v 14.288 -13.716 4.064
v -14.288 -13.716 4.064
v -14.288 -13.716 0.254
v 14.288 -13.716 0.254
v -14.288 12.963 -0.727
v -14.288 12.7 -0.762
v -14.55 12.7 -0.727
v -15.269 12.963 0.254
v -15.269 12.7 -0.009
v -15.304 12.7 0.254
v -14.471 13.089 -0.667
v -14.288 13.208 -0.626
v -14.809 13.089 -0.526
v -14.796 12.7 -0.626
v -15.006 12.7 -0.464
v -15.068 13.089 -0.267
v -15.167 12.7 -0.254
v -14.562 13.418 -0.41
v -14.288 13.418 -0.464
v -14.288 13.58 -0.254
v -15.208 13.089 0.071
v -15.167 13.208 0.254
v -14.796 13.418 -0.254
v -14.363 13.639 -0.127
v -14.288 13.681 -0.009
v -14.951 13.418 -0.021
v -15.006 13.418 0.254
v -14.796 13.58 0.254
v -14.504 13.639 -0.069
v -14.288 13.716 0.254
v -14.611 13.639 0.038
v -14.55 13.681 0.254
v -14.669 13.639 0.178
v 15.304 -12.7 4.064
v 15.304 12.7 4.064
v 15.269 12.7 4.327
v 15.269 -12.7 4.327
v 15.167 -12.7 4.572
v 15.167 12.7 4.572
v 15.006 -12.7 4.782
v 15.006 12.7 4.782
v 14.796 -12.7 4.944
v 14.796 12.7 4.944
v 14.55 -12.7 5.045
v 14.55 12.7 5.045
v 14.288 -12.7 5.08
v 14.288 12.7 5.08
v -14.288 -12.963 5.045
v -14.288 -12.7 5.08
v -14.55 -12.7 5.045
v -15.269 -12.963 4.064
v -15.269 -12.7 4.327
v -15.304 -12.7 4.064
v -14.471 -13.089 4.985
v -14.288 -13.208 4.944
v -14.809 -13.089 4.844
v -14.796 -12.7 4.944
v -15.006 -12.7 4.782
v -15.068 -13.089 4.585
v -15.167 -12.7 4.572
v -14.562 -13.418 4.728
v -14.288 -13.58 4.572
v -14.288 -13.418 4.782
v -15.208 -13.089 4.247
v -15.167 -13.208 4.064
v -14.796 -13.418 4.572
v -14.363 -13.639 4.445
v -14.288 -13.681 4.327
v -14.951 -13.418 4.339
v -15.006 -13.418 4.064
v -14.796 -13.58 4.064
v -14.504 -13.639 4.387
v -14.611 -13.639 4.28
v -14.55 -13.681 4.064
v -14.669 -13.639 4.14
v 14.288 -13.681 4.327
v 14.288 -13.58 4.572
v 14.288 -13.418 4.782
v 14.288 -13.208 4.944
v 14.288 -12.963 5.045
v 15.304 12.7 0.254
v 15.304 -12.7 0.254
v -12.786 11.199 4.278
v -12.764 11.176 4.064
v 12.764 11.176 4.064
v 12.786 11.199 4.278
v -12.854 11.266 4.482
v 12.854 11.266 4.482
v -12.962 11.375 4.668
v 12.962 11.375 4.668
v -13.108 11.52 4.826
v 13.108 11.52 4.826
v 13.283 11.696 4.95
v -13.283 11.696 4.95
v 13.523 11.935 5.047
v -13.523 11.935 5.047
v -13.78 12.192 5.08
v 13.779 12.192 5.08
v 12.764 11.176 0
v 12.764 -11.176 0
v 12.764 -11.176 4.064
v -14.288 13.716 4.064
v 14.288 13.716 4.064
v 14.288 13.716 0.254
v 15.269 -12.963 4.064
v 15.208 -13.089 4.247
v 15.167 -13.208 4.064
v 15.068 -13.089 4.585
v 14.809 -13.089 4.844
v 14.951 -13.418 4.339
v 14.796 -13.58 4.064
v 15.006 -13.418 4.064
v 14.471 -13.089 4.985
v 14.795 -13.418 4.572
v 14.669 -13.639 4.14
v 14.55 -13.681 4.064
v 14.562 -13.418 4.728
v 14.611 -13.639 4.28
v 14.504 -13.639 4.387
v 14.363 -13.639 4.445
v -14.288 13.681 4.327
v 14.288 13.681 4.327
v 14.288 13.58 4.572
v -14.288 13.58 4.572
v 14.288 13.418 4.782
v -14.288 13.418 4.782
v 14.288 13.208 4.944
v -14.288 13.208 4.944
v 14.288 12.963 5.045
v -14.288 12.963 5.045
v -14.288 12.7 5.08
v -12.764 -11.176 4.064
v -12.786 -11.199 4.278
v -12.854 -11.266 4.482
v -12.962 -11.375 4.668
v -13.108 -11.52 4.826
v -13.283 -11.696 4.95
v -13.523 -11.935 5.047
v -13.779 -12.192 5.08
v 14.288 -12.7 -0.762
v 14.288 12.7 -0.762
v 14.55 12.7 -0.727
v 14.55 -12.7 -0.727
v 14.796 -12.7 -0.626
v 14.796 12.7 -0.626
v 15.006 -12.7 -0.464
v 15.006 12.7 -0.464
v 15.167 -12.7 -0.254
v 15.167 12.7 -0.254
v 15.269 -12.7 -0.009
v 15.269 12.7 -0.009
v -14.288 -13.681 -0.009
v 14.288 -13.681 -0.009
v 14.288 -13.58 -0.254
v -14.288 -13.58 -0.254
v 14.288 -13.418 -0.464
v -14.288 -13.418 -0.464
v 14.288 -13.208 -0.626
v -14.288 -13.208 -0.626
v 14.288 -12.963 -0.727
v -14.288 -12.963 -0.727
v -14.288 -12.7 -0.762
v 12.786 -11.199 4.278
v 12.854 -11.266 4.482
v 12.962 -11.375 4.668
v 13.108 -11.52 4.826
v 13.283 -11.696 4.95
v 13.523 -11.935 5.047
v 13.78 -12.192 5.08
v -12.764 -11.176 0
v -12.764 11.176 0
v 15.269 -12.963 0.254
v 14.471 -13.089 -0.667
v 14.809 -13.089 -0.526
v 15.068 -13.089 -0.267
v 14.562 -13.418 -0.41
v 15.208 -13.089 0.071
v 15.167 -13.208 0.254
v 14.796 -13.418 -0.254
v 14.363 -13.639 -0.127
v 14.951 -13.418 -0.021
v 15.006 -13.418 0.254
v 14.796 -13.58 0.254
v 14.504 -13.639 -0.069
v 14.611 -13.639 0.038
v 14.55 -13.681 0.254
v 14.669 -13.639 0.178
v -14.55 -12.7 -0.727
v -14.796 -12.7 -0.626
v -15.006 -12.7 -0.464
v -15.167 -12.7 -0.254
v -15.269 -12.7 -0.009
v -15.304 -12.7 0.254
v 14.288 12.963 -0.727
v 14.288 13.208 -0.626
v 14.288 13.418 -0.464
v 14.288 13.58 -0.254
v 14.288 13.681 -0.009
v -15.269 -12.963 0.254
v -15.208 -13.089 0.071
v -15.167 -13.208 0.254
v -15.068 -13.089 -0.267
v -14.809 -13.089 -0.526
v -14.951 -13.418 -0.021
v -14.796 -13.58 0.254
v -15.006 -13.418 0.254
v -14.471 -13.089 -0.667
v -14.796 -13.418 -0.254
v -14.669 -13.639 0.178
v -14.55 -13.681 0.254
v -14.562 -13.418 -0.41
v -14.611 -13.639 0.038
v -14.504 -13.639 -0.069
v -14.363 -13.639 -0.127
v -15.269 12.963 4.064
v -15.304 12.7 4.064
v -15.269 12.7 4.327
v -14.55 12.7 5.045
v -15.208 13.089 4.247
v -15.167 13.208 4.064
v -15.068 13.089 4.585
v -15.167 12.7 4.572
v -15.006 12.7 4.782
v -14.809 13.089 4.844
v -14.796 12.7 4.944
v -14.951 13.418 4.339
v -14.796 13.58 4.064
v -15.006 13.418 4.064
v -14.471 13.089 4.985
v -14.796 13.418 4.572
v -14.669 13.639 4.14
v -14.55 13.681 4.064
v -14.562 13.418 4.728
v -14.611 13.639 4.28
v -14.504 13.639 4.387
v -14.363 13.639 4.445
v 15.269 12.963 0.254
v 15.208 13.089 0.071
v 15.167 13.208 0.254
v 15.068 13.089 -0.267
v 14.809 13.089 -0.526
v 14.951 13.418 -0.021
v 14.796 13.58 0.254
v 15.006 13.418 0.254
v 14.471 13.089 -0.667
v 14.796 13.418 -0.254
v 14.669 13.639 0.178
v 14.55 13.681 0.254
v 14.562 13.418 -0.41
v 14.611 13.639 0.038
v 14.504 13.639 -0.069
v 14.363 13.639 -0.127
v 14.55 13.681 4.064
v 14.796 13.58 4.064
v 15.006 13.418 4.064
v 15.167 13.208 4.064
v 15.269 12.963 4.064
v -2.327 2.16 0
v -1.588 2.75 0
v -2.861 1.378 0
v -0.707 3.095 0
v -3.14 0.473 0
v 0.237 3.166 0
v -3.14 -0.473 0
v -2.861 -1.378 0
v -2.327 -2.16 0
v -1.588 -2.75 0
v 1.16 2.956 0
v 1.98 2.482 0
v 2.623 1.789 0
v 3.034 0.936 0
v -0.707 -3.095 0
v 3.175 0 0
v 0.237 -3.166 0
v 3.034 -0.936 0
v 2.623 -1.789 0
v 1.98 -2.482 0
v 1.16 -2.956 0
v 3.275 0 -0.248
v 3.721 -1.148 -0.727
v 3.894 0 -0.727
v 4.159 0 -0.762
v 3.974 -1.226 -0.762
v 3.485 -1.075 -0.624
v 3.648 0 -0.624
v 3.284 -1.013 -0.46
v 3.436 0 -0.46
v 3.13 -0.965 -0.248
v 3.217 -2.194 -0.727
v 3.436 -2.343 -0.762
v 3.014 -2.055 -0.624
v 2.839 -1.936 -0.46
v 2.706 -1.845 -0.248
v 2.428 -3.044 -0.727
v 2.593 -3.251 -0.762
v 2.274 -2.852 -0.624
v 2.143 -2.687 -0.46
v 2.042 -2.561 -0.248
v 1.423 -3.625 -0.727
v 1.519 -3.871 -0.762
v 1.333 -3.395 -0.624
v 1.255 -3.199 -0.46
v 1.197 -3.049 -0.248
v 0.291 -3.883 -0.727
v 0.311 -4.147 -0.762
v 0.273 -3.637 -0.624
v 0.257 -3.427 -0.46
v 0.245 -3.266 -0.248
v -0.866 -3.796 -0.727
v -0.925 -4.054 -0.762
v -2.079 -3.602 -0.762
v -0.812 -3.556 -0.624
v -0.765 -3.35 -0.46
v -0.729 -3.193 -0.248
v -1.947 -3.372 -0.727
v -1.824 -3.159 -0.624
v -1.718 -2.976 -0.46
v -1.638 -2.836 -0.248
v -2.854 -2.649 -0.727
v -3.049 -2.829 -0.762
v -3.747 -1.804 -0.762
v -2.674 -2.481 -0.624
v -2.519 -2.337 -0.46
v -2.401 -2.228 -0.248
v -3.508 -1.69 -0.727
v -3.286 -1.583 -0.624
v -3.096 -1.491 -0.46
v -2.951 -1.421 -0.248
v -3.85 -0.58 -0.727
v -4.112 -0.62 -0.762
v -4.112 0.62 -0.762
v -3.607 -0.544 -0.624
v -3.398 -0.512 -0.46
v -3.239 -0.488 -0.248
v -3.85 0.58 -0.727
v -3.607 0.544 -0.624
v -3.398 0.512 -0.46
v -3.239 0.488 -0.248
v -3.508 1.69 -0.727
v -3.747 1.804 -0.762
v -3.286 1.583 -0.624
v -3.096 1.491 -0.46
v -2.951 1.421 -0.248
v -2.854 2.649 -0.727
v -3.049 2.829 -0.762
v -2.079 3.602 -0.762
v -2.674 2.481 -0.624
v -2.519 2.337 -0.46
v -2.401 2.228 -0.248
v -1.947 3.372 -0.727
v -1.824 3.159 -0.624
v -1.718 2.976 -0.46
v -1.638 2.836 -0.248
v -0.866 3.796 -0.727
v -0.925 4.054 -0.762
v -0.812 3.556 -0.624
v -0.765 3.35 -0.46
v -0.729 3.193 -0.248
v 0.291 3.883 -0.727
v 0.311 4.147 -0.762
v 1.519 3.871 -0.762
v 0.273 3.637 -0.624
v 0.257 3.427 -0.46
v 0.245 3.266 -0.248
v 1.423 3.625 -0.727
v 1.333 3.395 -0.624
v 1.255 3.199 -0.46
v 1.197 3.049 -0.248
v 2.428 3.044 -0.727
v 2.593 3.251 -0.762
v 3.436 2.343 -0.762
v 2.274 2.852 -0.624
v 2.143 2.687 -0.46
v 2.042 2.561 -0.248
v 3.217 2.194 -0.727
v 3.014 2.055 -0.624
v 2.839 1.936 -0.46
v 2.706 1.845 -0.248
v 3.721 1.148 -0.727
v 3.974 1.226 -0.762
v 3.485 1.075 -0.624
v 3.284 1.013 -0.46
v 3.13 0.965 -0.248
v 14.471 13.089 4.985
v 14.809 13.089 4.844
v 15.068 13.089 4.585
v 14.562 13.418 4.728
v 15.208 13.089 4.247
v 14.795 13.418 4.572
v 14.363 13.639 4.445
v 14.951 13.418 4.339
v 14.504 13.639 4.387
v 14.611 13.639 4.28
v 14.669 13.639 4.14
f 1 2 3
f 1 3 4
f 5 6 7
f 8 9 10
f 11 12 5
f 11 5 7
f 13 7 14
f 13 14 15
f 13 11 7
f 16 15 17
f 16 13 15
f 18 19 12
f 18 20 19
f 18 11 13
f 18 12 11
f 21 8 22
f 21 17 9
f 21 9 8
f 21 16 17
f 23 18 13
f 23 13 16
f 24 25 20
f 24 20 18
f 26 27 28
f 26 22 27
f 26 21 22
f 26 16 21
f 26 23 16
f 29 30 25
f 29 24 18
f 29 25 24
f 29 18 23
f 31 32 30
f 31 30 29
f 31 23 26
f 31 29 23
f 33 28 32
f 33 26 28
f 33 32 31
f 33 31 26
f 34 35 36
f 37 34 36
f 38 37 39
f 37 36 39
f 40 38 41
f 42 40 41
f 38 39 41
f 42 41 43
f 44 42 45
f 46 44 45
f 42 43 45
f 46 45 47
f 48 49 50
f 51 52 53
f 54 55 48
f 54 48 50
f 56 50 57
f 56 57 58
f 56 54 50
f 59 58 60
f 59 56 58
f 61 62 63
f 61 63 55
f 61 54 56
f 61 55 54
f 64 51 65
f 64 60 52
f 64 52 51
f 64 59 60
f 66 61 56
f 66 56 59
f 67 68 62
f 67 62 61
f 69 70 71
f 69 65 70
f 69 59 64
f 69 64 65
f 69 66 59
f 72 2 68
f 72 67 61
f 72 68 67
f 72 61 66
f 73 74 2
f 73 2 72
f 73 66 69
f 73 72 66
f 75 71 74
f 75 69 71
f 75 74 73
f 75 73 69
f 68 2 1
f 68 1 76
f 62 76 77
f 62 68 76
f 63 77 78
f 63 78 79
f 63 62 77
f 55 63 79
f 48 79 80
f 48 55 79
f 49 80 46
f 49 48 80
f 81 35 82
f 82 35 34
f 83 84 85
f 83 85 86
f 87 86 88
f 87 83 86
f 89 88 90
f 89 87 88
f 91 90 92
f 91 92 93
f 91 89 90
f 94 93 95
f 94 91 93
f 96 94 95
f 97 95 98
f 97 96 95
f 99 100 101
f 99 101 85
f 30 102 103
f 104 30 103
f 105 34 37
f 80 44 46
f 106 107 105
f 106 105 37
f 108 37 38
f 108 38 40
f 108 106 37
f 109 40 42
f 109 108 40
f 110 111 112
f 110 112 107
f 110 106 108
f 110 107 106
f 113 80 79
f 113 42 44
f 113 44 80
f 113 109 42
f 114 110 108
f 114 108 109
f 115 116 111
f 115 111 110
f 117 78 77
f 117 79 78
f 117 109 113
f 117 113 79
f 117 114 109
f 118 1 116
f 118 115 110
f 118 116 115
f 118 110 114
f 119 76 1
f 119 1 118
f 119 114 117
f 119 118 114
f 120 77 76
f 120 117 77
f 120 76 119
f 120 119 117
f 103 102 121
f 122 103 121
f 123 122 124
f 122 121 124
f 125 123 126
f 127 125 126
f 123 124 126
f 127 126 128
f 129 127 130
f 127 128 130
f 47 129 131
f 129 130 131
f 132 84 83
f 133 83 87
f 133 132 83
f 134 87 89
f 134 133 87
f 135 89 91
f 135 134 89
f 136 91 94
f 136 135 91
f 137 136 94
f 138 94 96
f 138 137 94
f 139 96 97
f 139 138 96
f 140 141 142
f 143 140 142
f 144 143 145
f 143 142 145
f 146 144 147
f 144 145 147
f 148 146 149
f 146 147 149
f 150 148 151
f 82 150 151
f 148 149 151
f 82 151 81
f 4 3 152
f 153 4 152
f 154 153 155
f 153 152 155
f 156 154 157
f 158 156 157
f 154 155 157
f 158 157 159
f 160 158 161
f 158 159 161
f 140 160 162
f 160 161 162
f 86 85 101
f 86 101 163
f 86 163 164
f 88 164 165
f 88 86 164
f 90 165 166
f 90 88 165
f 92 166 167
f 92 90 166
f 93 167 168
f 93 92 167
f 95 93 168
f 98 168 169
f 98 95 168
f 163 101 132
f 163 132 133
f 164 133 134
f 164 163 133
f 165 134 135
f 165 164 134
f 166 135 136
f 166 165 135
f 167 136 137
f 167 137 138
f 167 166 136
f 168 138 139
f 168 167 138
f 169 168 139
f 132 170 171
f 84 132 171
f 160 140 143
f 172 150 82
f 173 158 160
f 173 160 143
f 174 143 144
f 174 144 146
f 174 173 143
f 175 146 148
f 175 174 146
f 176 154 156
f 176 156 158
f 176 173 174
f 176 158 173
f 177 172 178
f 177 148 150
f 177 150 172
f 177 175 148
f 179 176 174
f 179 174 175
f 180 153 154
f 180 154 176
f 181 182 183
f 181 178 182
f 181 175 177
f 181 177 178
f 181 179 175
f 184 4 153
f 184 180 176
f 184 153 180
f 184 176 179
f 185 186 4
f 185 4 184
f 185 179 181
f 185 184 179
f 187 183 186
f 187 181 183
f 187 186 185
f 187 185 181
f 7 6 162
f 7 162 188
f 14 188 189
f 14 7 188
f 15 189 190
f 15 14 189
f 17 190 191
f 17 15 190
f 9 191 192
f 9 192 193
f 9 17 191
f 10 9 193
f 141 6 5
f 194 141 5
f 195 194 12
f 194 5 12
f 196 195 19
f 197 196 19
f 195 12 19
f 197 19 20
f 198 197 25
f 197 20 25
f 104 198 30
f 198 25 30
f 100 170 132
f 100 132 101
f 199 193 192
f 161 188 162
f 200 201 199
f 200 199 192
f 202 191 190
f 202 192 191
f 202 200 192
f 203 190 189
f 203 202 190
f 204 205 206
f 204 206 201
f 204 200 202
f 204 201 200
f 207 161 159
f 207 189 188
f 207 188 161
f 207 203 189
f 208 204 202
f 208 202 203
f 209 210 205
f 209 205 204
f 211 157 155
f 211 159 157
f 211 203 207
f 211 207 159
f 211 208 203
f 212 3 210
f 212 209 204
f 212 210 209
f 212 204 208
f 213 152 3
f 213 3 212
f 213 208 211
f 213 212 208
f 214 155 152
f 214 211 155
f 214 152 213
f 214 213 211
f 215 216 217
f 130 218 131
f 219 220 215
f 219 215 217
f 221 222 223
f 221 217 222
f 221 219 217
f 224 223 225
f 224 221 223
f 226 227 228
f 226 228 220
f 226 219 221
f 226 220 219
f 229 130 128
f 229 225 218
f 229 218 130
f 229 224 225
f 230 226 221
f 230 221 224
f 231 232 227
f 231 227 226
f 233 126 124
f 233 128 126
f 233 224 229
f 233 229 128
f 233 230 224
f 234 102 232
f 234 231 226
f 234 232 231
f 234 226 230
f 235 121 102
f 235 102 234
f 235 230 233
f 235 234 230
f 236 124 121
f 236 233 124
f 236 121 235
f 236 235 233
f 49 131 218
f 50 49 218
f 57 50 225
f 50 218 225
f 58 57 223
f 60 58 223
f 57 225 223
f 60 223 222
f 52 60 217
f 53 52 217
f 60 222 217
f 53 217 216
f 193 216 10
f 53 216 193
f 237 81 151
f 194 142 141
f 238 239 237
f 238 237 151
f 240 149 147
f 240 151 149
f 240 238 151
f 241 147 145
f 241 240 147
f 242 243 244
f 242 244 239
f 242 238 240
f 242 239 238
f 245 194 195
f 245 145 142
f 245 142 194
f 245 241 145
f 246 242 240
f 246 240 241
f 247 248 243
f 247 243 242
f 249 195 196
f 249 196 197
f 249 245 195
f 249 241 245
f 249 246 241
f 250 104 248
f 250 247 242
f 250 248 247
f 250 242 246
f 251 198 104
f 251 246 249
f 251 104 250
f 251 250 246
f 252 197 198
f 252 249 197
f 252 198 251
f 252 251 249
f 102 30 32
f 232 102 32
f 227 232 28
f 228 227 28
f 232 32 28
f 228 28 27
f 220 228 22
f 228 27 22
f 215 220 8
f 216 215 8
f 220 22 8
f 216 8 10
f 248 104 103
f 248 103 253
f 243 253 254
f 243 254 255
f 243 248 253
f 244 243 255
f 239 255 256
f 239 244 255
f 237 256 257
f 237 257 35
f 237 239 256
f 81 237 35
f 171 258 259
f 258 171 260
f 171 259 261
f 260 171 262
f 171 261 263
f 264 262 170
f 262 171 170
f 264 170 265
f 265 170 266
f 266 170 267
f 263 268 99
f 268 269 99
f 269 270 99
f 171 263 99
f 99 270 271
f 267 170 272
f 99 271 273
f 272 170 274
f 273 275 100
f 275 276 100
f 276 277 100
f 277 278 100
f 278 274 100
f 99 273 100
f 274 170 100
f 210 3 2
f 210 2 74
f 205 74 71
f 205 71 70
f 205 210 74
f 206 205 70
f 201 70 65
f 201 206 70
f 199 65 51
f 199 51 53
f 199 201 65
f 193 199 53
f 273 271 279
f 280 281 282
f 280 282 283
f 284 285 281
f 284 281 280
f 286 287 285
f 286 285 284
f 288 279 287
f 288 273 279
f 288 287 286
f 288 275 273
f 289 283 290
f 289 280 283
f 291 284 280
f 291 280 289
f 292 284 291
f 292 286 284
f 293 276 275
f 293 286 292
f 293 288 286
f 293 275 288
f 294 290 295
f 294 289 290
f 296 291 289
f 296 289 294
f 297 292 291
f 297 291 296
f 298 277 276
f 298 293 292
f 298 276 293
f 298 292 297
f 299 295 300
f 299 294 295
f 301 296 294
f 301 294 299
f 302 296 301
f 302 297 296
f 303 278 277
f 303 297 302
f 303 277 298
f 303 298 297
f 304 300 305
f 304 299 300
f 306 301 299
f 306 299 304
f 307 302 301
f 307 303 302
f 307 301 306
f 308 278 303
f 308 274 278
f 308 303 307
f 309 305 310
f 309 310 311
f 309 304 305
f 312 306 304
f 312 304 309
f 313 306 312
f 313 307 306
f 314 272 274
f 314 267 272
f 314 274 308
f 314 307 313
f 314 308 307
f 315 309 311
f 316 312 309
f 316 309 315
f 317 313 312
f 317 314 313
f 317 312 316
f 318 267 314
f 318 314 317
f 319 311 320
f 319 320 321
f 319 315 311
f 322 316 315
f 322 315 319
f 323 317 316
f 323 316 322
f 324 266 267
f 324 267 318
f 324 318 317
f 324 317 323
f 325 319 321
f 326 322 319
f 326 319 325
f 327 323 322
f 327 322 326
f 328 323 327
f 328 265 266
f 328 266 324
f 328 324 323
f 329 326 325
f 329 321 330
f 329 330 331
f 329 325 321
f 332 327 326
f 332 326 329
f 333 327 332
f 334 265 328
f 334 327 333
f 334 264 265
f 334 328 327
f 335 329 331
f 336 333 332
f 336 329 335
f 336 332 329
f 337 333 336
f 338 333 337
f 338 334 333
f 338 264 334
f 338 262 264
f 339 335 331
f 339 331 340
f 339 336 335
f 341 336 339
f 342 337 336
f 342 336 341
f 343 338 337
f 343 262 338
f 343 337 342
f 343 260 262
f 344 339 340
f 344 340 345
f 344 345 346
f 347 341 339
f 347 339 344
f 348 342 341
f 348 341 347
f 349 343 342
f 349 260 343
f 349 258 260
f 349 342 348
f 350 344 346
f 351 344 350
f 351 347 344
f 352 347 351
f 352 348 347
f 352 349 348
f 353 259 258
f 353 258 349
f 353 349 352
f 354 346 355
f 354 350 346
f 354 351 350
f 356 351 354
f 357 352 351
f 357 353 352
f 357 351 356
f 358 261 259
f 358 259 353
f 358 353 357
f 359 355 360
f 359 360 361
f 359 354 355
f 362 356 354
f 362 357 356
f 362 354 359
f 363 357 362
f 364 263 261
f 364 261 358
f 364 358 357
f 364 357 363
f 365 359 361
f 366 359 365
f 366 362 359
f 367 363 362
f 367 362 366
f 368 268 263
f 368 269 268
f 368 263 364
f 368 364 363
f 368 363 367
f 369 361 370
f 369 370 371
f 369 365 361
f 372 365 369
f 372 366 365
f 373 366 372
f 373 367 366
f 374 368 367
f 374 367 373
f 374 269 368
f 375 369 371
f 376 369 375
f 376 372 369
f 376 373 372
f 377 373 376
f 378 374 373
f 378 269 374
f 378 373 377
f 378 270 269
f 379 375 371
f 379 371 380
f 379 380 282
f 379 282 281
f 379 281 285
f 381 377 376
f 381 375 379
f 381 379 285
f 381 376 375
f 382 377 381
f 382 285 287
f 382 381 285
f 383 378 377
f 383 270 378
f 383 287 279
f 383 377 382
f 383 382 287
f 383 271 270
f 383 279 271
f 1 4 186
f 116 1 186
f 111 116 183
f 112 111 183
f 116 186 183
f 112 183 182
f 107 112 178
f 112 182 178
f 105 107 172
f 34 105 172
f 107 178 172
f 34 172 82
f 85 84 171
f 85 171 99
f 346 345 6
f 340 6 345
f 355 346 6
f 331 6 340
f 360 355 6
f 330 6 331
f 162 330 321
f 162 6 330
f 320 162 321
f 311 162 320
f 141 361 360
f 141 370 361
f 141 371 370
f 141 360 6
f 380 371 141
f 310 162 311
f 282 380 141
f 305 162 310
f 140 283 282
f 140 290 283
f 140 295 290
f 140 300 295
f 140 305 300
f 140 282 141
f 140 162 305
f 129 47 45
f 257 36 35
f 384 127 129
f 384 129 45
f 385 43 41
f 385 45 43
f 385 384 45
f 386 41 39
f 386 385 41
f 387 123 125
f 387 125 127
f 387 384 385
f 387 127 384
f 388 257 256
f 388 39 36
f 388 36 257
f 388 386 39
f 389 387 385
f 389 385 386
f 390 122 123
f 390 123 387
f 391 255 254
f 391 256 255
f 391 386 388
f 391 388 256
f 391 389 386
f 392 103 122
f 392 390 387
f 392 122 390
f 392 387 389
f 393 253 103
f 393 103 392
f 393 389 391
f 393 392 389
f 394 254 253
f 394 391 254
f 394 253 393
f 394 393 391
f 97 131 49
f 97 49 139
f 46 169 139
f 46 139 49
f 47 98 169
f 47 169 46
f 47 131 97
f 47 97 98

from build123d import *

# Parameters (mm, degrees)
F0_W          = 30.607
F0_H          = 27.432
F0_W_2        = 25.527
F0_H_2        = 22.352
F1_DEPTH      = 5.08
F2_W          = 30.607
F2_H          = 27.432
F2_R          = 3.175
F3_DEPTH      = 0.762
F4_T1_DEPTH   = 3.81
F4_T3_DEPTH   = 28.575
F4_T5_DEPTH   = 25.4
F4_T7_DEPTH   = 22.352
F4_T9_DEPTH   = 25.527
F4_S13_W      = 1.03632
F4_S13_H      = 1.03632
F4_T14_DEPTH  = 1.03632
F4_S19_W      = 1.03632
F4_S19_H      = 1.03632
F4_T20_DEPTH  = 1.03632
F4_S25_W      = 1.03632
F4_S25_H      = 1.03632
F4_T26_DEPTH  = 1.03632
F4_S31_W      = 1.03632
F4_S31_H      = 1.03632
F4_T32_DEPTH  = 1.03632
F4_S37_W      = 1.03632
F4_S37_H      = 1.03632
F4_T38_DEPTH  = 1.03632
F4_S43_W      = 1.03632
F4_S43_H      = 1.03632
F4_T44_DEPTH  = 1.03632
F4_S49_W      = 1.03632
F4_S49_H      = 1.03632
F4_T50_DEPTH  = 1.03632
F4_S55_W      = 1.03632
F4_S55_H      = 1.03632
F4_T56_DEPTH  = 1.03632
F4_T65_DEPTH  = 28.067
F4_T69_DEPTH  = 24.892
F4_T76_DEPTH  = 24.892
F4_T80_DEPTH  = 28.067
F4_T87_DEPTH  = 24.892
F4_T91_DEPTH  = 28.067
F4_T98_DEPTH  = 24.892
F4_T102_DEPTH = 28.067


# Not quite as in the source:
# - a fillet or chamfer that OpenCascade refuses, or shapes differently, is made with other operations: its cross-section is extruded or revolved along the edge and cut away or added


with BuildPart() as f1:
    # F0 (on Top) → F1 (new body)
    with BuildSketch(Plane.XY):
        Rectangle(F0_W, F0_H)
        Rectangle(F0_W_2, F0_H_2, mode=Mode.SUBTRACT)
    extrude(amount=F1_DEPTH)

    # F2 (on face) → F3 (join)
    with BuildSketch(Plane(origin=(0, 0, 0), x_dir=(1, 0, 0), z_dir=(0, 0, -1))):
        Rectangle(F2_W, F2_H)
        Circle(F2_R, mode=Mode.SUBTRACT)
    extrude(amount=F3_DEPTH)

    # F4: fillet of radius 1.016 on 17 edges, made by hand

    # F4_s2 → F4_t1 (cut)
    with BuildSketch(Plane.XY.offset(0.254)):
        with BuildLine():
            ThreePointArc((-14.2875, -13.716), (-15.0059204897, -13.4184204897), (-15.3035, -12.7))
            Line((-15.3035, -12.7), (-15.3035, -13.716))
            Line((-15.3035, -13.716), (-14.2875, -13.716))
        make_face()
        with BuildLine():
            ThreePointArc((14.2875, -13.716), (15.0059204897, -13.4184204897), (15.3035, -12.7))
            Line((15.3035, -12.7), (15.3035, -13.716))
            Line((15.3035, -13.716), (14.2875, -13.716))
        make_face()
        with BuildLine():
            ThreePointArc((-14.2875, 13.716), (-15.0059204897, 13.4184204897), (-15.3035, 12.7))
            Line((-15.3035, 12.7), (-15.3035, 13.716))
            Line((-15.3035, 13.716), (-14.2875, 13.716))
        make_face()
        with BuildLine():
            ThreePointArc((14.2875, 13.716), (15.0059204897, 13.4184204897), (15.3035, 12.7))
            Line((15.3035, 12.7), (15.3035, 13.716))
            Line((15.3035, 13.716), (14.2875, 13.716))
        make_face()
    extrude(amount=F4_T1_DEPTH, mode=Mode.SUBTRACT)

    # F4_s4 → F4_t3 (cut)
    with BuildSketch(Plane.YZ.offset(-14.2875)):
        with BuildLine():
            ThreePointArc((-13.716, 4.064), (-13.4184204897, 4.7824204897), (-12.7, 5.08))
            Line((-12.7, 5.08), (-13.716, 5.08))
            Line((-13.716, 5.08), (-13.716, 4.064))
        make_face()
        with BuildLine():
            ThreePointArc((-13.716, 0.254), (-13.4184204897, -0.4644204897), (-12.7, -0.762))
            Line((-12.7, -0.762), (-13.716, -0.762))
            Line((-13.716, -0.762), (-13.716, 0.254))
        make_face()
        with BuildLine():
            ThreePointArc((12.7, -0.762), (13.4184204897, -0.4644204897), (13.716, 0.254))
            Line((13.716, 0.254), (13.716, -0.762))
            Line((13.716, -0.762), (12.7, -0.762))
        make_face()
        with BuildLine():
            ThreePointArc((13.716, 4.064), (13.4184204897, 4.7824204897), (12.7, 5.08))
            Line((12.7, 5.08), (13.716, 5.08))
            Line((13.716, 5.08), (13.716, 4.064))
        make_face()
    extrude(amount=F4_T3_DEPTH, mode=Mode.SUBTRACT)

    # F4_s6 → F4_t5 (cut)
    with BuildSketch(Plane.XZ.offset(-12.7)):
        with BuildLine():
            ThreePointArc((-14.2875, -0.762), (-15.0059204897, -0.4644204897), (-15.3035, 0.254))
            Line((-15.3035, 0.254), (-15.3035, -0.762))
            Line((-15.3035, -0.762), (-14.2875, -0.762))
        make_face()
        with BuildLine():
            ThreePointArc((14.2875, -0.762), (15.0059204897, -0.4644204897), (15.3035, 0.254))
            Line((15.3035, 0.254), (15.3035, -0.762))
            Line((15.3035, -0.762), (14.2875, -0.762))
        make_face()
        with BuildLine():
            ThreePointArc((-14.2875, 5.08), (-15.0059204897, 4.7824204897), (-15.3035, 4.064))
            Line((-15.3035, 4.064), (-15.3035, 5.08))
            Line((-15.3035, 5.08), (-14.2875, 5.08))
        make_face()
        with BuildLine():
            ThreePointArc((15.3035, 4.064), (15.0059204897, 4.7824204897), (14.2875, 5.08))
            Line((14.2875, 5.08), (15.3035, 5.08))
            Line((15.3035, 5.08), (15.3035, 4.064))
        make_face()
    extrude(amount=F4_T5_DEPTH, mode=Mode.SUBTRACT)

    # F4_s8 → F4_t7 (cut)
    with BuildSketch(Plane.XZ.offset(-11.176)):
        with BuildLine():
            ThreePointArc((-12.7635, 4.064), (-13.0610795103, 4.7824204897), (-13.7795, 5.08))
            Line((-13.7795, 5.08), (-12.7635, 5.08))
            Line((-12.7635, 5.08), (-12.7635, 4.064))
        make_face()
        with BuildLine():
            ThreePointArc((12.7635, 4.064), (13.0610795103, 4.7824204897), (13.7795, 5.08))
            Line((13.7795, 5.08), (12.7635, 5.08))
            Line((12.7635, 5.08), (12.7635, 4.064))
        make_face()
    extrude(amount=F4_T7_DEPTH, mode=Mode.SUBTRACT)

    # F4_s10 → F4_t9 (cut)
    with BuildSketch(Plane.YZ.offset(-12.7635)):
        with BuildLine():
            ThreePointArc((11.176, 4.064), (11.4735795103, 4.7824204897), (12.192, 5.08))
            Line((12.192, 5.08), (11.176, 5.08))
            Line((11.176, 5.08), (11.176, 4.064))
        make_face()
        with BuildLine():
            ThreePointArc((-11.176, 4.064), (-11.4735795103, 4.7824204897), (-12.192, 5.08))
            Line((-12.192, 5.08), (-11.176, 5.08))
            Line((-11.176, 5.08), (-11.176, 4.064))
        make_face()
    extrude(amount=F4_T9_DEPTH, mode=Mode.SUBTRACT)


with BuildPart() as f4_tool12:
    # F4_s13 → F4_t14 (new body)
    with BuildSketch(Plane.XZ.offset(12.7)):
        with Locations((-14.80566, 4.58216)):
            Rectangle(F4_S13_W, F4_S13_H)
    extrude(amount=F4_T14_DEPTH)

    # F4_s15 → F4_t16 (revolve, cut)
    with BuildSketch(Plane(origin=(-14.2875, -12.7, 4.064), x_dir=(0.7071067812, 0, -0.7071067812), z_dir=(-0.7071067812, 0, -0.7071067812))):
        with BuildLine():
            ThreePointArc((0, -1.016), (1.016, 0), (0, 1.016))
            Line((0, 1.016), (0, -1.016))
        make_face()
    revolve(axis=Axis((-14.2875, -12.7, 4.064), (0, -1, 0)), mode=Mode.SUBTRACT)


with BuildPart() as f1_1:
    add(f1.part)

    # F4_t11: cut F4_tool12
    add(f4_tool12.part, mode=Mode.SUBTRACT)


with BuildPart() as f4_tool18:
    # F4_s19 → F4_t20 (new body)
    with BuildSketch(Plane.XZ.offset(12.7)):
        with Locations((-14.80566, -0.26416)):
            Rectangle(F4_S19_W, F4_S19_H)
    extrude(amount=F4_T20_DEPTH)

    # F4_s21 → F4_t22 (revolve, cut)
    with BuildSketch(Plane(origin=(-14.2875, -12.7, 0.254), x_dir=(0.7071067812, 0, 0.7071067812), z_dir=(0.7071067812, 0, -0.7071067812))):
        with BuildLine():
            ThreePointArc((0, -1.016), (1.016, 0), (0, 1.016))
            Line((0, 1.016), (0, -1.016))
        make_face()
    revolve(axis=Axis((-14.2875, -12.7, 0.254), (0, -1, 0)), mode=Mode.SUBTRACT)


with BuildPart() as f1_2:
    add(f1_1.part)

    # F4_t17: cut F4_tool18
    add(f4_tool18.part, mode=Mode.SUBTRACT)


with BuildPart() as f4_tool24:
    # F4_s25 → F4_t26 (new body)
    with BuildSketch(Plane.XZ.offset(12.7)):
        with Locations((14.80566, 4.58216)):
            Rectangle(F4_S25_W, F4_S25_H)
    extrude(amount=F4_T26_DEPTH)

    # F4_s27 → F4_t28 (revolve, cut)
    with BuildSketch(Plane(origin=(14.2875, -12.7, 4.064), x_dir=(-0.7071067812, 0, -0.7071067812), z_dir=(-0.7071067812, 0, 0.7071067812))):
        with BuildLine():
            ThreePointArc((0, -1.016), (1.016, 0), (0, 1.016))
            Line((0, 1.016), (0, -1.016))
        make_face()
    revolve(axis=Axis((14.2875, -12.7, 4.064), (0, -1, 0)), mode=Mode.SUBTRACT)


with BuildPart() as f1_3:
    add(f1_2.part)

    # F4_t23: cut F4_tool24
    add(f4_tool24.part, mode=Mode.SUBTRACT)


with BuildPart() as f4_tool30:
    # F4_s31 → F4_t32 (new body)
    with BuildSketch(Plane.XZ.offset(12.7)):
        with Locations((14.80566, -0.26416)):
            Rectangle(F4_S31_W, F4_S31_H)
    extrude(amount=F4_T32_DEPTH)

    # F4_s33 → F4_t34 (revolve, cut)
    with BuildSketch(Plane(origin=(14.2875, -12.7, 0.254), x_dir=(-0.7071067812, 0, 0.7071067812), z_dir=(0.7071067812, 0, 0.7071067812))):
        with BuildLine():
            ThreePointArc((0, -1.016), (1.016, 0), (0, 1.016))
            Line((0, 1.016), (0, -1.016))
        make_face()
    revolve(axis=Axis((14.2875, -12.7, 0.254), (0, -1, 0)), mode=Mode.SUBTRACT)


with BuildPart() as f1_4:
    add(f1_3.part)

    # F4_t29: cut F4_tool30
    add(f4_tool30.part, mode=Mode.SUBTRACT)


with BuildPart() as f4_tool36:
    # F4_s37 → F4_t38 (new body)
    with BuildSketch(Plane.XZ.offset(-12.7)):
        with Locations((-14.80566, -0.26416)):
            Rectangle(F4_S37_W, F4_S37_H)
    extrude(amount=-F4_T38_DEPTH)

    # F4_s39 → F4_t40 (revolve, cut)
    with BuildSketch(Plane(origin=(-14.2875, 12.7, 0.254), x_dir=(0.7071067812, 0, 0.7071067812), z_dir=(-0.7071067812, 0, 0.7071067812))):
        with BuildLine():
            ThreePointArc((0, -1.016), (1.016, 0), (0, 1.016))
            Line((0, 1.016), (0, -1.016))
        make_face()
    revolve(axis=Axis((-14.2875, 12.7, 0.254), (0, 1, 0)), mode=Mode.SUBTRACT)


with BuildPart() as f1_5:
    add(f1_4.part)

    # F4_t35: cut F4_tool36
    add(f4_tool36.part, mode=Mode.SUBTRACT)


with BuildPart() as f4_tool42:
    # F4_s43 → F4_t44 (new body)
    with BuildSketch(Plane.XZ.offset(-12.7)):
        with Locations((14.80566, -0.26416)):
            Rectangle(F4_S43_W, F4_S43_H)
    extrude(amount=-F4_T44_DEPTH)

    # F4_s45 → F4_t46 (revolve, cut)
    with BuildSketch(Plane(origin=(14.2875, 12.7, 0.254), x_dir=(-0.7071067812, 0, 0.7071067812), z_dir=(-0.7071067812, 0, -0.7071067812))):
        with BuildLine():
            ThreePointArc((0, -1.016), (1.016, 0), (0, 1.016))
            Line((0, 1.016), (0, -1.016))
        make_face()
    revolve(axis=Axis((14.2875, 12.7, 0.254), (0, 1, 0)), mode=Mode.SUBTRACT)


with BuildPart() as f1_6:
    add(f1_5.part)

    # F4_t41: cut F4_tool42
    add(f4_tool42.part, mode=Mode.SUBTRACT)


with BuildPart() as f4_tool48:
    # F4_s49 → F4_t50 (new body)
    with BuildSketch(Plane.XZ.offset(-12.7)):
        with Locations((14.80566, 4.58216)):
            Rectangle(F4_S49_W, F4_S49_H)
    extrude(amount=-F4_T50_DEPTH)

    # F4_s51 → F4_t52 (revolve, cut)
    with BuildSketch(Plane(origin=(14.2875, 12.7, 4.064), x_dir=(-0.7071067812, 0, -0.7071067812), z_dir=(0.7071067812, 0, -0.7071067812))):
        with BuildLine():
            ThreePointArc((0, -1.016), (1.016, 0), (0, 1.016))
            Line((0, 1.016), (0, -1.016))
        make_face()
    revolve(axis=Axis((14.2875, 12.7, 4.064), (0, 1, 0)), mode=Mode.SUBTRACT)


with BuildPart() as f1_7:
    add(f1_6.part)

    # F4_t47: cut F4_tool48
    add(f4_tool48.part, mode=Mode.SUBTRACT)


with BuildPart() as f4_tool54:
    # F4_s55 → F4_t56 (new body)
    with BuildSketch(Plane.XZ.offset(-12.7)):
        with Locations((-14.80566, 4.58216)):
            Rectangle(F4_S55_W, F4_S55_H)
    extrude(amount=-F4_T56_DEPTH)

    # F4_s57 → F4_t58 (revolve, cut)
    with BuildSketch(Plane(origin=(-14.2875, 12.7, 4.064), x_dir=(0.7071067812, 0, -0.7071067812), z_dir=(0.7071067812, 0, 0.7071067812))):
        with BuildLine():
            ThreePointArc((0, -1.016), (1.016, 0), (0, 1.016))
            Line((0, 1.016), (0, -1.016))
        make_face()
    revolve(axis=Axis((-14.2875, 12.7, 4.064), (0, 1, 0)), mode=Mode.SUBTRACT)


with BuildPart() as f1_8:
    add(f1_7.part)

    # F4_t53: cut F4_tool54
    add(f4_tool54.part, mode=Mode.SUBTRACT)

    # F4_s59 → F4_t60 (revolve, cut)
    with BuildSketch(Plane.XZ):
        with BuildLine():
            ThreePointArc((4.1587377699, -0.762), (3.5365673753, -0.5492185257), (3.175, 0))
            Line((3.175, 0), (3.175, -0.762))
            Line((3.175, -0.762), (4.1587377699, -0.762))
        make_face()
    revolve(axis=Axis((0, 0, -0.762), (0, 0, -1)), mode=Mode.SUBTRACT)


with BuildPart() as f4_tool63:
    # F4_s64 → F4_t65 (new body)
    with BuildSketch(Plane.YZ.offset(12.7635)):
        with BuildLine():
            ThreePointArc((-11.176, 4.064), (-11.4735795103, 4.7824204897), (-12.192, 5.08))
            Line((-12.192, 5.08), (-11.176, 5.08))
            Line((-11.176, 5.08), (-11.176, 4.064))
        make_face()
    extrude(amount=-F4_T65_DEPTH)

    split(bisect_by=Plane.YZ.offset(-12.7635), keep=Keep.BOTTOM)


with BuildPart() as f4_tool67:
    # F4_s68 → F4_t69 (new body)
    with BuildSketch(Plane.XZ.offset(13.716)):
        with BuildLine():
            ThreePointArc((-12.7635, 4.064), (-13.0610795103, 4.7824204897), (-13.7795, 5.08))
            Line((-13.7795, 5.08), (-12.7635, 5.08))
            Line((-12.7635, 5.08), (-12.7635, 4.064))
        make_face()
    extrude(amount=-F4_T69_DEPTH)

    split(bisect_by=Plane.XZ.offset(11.176), keep=Keep.TOP)


with BuildPart() as f4_tool63_1:
    add(f4_tool63.part)

    # F4_t71: intersect F4_tool67
    add(f4_tool67.part, mode=Mode.INTERSECT)


with BuildPart() as f1_9:
    add(f1_8.part)

    # F4_t61: cut F4_tool63
    add(f4_tool63_1.part, mode=Mode.SUBTRACT)


with BuildPart() as f4_tool74:
    # F4_s75 → F4_t76 (new body)
    with BuildSketch(Plane.XZ.offset(11.176)):
        with BuildLine():
            ThreePointArc((-12.7635, 4.064), (-13.0610795103, 4.7824204897), (-13.7795, 5.08))
            Line((-13.7795, 5.08), (-12.7635, 5.08))
            Line((-12.7635, 5.08), (-12.7635, 4.064))
        make_face()
    extrude(amount=-F4_T76_DEPTH)

    split(bisect_by=Plane.XZ.offset(-11.176), keep=Keep.BOTTOM)


with BuildPart() as f4_tool78:
    # F4_s79 → F4_t80 (new body)
    with BuildSketch(Plane.YZ.offset(-15.3035)):
        with BuildLine():
            ThreePointArc((11.176, 4.064), (11.4735795103, 4.7824204897), (12.192, 5.08))
            Line((12.192, 5.08), (11.176, 5.08))
            Line((11.176, 5.08), (11.176, 4.064))
        make_face()
    extrude(amount=F4_T80_DEPTH)

    split(bisect_by=Plane.YZ.offset(-12.7635), keep=Keep.BOTTOM)


with BuildPart() as f4_tool74_1:
    add(f4_tool74.part)

    # F4_t82: intersect F4_tool78
    add(f4_tool78.part, mode=Mode.INTERSECT)


with BuildPart() as f1_10:
    add(f1_9.part)

    # F4_t72: cut F4_tool74
    add(f4_tool74_1.part, mode=Mode.SUBTRACT)


with BuildPart() as f4_tool85:
    # F4_s86 → F4_t87 (new body)
    with BuildSketch(Plane.XZ.offset(-13.716)):
        with BuildLine():
            ThreePointArc((12.7635, 4.064), (13.0610795103, 4.7824204897), (13.7795, 5.08))
            Line((13.7795, 5.08), (12.7635, 5.08))
            Line((12.7635, 5.08), (12.7635, 4.064))
        make_face()
    extrude(amount=F4_T87_DEPTH)

    split(bisect_by=Plane.XZ.offset(-11.176), keep=Keep.BOTTOM)


with BuildPart() as f4_tool89:
    # F4_s90 → F4_t91 (new body)
    with BuildSketch(Plane.YZ.offset(-12.7635)):
        with BuildLine():
            ThreePointArc((11.176, 4.064), (11.4735795103, 4.7824204897), (12.192, 5.08))
            Line((12.192, 5.08), (11.176, 5.08))
            Line((11.176, 5.08), (11.176, 4.064))
        make_face()
    extrude(amount=F4_T91_DEPTH)

    split(bisect_by=Plane.YZ.offset(12.7635), keep=Keep.TOP)


with BuildPart() as f4_tool85_1:
    add(f4_tool85.part)

    # F4_t93: intersect F4_tool89
    add(f4_tool89.part, mode=Mode.INTERSECT)


with BuildPart() as f1_11:
    add(f1_10.part)

    # F4_t83: cut F4_tool85
    add(f4_tool85_1.part, mode=Mode.SUBTRACT)


with BuildPart() as f4_tool96:
    # F4_s97 → F4_t98 (new body)
    with BuildSketch(Plane.XZ.offset(-11.176)):
        with BuildLine():
            ThreePointArc((12.7635, 4.064), (13.0610795103, 4.7824204897), (13.7795, 5.08))
            Line((13.7795, 5.08), (12.7635, 5.08))
            Line((12.7635, 5.08), (12.7635, 4.064))
        make_face()
    extrude(amount=F4_T98_DEPTH)

    split(bisect_by=Plane.XZ.offset(11.176), keep=Keep.TOP)


with BuildPart() as f4_tool100:
    # F4_s101 → F4_t102 (new body)
    with BuildSketch(Plane.YZ.offset(15.3035)):
        with BuildLine():
            ThreePointArc((-11.176, 4.064), (-11.4735795103, 4.7824204897), (-12.192, 5.08))
            Line((-12.192, 5.08), (-11.176, 5.08))
            Line((-11.176, 5.08), (-11.176, 4.064))
        make_face()
    extrude(amount=-F4_T102_DEPTH)

    split(bisect_by=Plane.YZ.offset(12.7635), keep=Keep.TOP)


with BuildPart() as f4_tool96_1:
    add(f4_tool96.part)

    # F4_t104: intersect F4_tool100
    add(f4_tool100.part, mode=Mode.INTERSECT)


with BuildPart() as f1_12:
    add(f1_11.part)

    # F4_t94: cut F4_tool96
    add(f4_tool96_1.part, mode=Mode.SUBTRACT)


solid = f1_12.part
